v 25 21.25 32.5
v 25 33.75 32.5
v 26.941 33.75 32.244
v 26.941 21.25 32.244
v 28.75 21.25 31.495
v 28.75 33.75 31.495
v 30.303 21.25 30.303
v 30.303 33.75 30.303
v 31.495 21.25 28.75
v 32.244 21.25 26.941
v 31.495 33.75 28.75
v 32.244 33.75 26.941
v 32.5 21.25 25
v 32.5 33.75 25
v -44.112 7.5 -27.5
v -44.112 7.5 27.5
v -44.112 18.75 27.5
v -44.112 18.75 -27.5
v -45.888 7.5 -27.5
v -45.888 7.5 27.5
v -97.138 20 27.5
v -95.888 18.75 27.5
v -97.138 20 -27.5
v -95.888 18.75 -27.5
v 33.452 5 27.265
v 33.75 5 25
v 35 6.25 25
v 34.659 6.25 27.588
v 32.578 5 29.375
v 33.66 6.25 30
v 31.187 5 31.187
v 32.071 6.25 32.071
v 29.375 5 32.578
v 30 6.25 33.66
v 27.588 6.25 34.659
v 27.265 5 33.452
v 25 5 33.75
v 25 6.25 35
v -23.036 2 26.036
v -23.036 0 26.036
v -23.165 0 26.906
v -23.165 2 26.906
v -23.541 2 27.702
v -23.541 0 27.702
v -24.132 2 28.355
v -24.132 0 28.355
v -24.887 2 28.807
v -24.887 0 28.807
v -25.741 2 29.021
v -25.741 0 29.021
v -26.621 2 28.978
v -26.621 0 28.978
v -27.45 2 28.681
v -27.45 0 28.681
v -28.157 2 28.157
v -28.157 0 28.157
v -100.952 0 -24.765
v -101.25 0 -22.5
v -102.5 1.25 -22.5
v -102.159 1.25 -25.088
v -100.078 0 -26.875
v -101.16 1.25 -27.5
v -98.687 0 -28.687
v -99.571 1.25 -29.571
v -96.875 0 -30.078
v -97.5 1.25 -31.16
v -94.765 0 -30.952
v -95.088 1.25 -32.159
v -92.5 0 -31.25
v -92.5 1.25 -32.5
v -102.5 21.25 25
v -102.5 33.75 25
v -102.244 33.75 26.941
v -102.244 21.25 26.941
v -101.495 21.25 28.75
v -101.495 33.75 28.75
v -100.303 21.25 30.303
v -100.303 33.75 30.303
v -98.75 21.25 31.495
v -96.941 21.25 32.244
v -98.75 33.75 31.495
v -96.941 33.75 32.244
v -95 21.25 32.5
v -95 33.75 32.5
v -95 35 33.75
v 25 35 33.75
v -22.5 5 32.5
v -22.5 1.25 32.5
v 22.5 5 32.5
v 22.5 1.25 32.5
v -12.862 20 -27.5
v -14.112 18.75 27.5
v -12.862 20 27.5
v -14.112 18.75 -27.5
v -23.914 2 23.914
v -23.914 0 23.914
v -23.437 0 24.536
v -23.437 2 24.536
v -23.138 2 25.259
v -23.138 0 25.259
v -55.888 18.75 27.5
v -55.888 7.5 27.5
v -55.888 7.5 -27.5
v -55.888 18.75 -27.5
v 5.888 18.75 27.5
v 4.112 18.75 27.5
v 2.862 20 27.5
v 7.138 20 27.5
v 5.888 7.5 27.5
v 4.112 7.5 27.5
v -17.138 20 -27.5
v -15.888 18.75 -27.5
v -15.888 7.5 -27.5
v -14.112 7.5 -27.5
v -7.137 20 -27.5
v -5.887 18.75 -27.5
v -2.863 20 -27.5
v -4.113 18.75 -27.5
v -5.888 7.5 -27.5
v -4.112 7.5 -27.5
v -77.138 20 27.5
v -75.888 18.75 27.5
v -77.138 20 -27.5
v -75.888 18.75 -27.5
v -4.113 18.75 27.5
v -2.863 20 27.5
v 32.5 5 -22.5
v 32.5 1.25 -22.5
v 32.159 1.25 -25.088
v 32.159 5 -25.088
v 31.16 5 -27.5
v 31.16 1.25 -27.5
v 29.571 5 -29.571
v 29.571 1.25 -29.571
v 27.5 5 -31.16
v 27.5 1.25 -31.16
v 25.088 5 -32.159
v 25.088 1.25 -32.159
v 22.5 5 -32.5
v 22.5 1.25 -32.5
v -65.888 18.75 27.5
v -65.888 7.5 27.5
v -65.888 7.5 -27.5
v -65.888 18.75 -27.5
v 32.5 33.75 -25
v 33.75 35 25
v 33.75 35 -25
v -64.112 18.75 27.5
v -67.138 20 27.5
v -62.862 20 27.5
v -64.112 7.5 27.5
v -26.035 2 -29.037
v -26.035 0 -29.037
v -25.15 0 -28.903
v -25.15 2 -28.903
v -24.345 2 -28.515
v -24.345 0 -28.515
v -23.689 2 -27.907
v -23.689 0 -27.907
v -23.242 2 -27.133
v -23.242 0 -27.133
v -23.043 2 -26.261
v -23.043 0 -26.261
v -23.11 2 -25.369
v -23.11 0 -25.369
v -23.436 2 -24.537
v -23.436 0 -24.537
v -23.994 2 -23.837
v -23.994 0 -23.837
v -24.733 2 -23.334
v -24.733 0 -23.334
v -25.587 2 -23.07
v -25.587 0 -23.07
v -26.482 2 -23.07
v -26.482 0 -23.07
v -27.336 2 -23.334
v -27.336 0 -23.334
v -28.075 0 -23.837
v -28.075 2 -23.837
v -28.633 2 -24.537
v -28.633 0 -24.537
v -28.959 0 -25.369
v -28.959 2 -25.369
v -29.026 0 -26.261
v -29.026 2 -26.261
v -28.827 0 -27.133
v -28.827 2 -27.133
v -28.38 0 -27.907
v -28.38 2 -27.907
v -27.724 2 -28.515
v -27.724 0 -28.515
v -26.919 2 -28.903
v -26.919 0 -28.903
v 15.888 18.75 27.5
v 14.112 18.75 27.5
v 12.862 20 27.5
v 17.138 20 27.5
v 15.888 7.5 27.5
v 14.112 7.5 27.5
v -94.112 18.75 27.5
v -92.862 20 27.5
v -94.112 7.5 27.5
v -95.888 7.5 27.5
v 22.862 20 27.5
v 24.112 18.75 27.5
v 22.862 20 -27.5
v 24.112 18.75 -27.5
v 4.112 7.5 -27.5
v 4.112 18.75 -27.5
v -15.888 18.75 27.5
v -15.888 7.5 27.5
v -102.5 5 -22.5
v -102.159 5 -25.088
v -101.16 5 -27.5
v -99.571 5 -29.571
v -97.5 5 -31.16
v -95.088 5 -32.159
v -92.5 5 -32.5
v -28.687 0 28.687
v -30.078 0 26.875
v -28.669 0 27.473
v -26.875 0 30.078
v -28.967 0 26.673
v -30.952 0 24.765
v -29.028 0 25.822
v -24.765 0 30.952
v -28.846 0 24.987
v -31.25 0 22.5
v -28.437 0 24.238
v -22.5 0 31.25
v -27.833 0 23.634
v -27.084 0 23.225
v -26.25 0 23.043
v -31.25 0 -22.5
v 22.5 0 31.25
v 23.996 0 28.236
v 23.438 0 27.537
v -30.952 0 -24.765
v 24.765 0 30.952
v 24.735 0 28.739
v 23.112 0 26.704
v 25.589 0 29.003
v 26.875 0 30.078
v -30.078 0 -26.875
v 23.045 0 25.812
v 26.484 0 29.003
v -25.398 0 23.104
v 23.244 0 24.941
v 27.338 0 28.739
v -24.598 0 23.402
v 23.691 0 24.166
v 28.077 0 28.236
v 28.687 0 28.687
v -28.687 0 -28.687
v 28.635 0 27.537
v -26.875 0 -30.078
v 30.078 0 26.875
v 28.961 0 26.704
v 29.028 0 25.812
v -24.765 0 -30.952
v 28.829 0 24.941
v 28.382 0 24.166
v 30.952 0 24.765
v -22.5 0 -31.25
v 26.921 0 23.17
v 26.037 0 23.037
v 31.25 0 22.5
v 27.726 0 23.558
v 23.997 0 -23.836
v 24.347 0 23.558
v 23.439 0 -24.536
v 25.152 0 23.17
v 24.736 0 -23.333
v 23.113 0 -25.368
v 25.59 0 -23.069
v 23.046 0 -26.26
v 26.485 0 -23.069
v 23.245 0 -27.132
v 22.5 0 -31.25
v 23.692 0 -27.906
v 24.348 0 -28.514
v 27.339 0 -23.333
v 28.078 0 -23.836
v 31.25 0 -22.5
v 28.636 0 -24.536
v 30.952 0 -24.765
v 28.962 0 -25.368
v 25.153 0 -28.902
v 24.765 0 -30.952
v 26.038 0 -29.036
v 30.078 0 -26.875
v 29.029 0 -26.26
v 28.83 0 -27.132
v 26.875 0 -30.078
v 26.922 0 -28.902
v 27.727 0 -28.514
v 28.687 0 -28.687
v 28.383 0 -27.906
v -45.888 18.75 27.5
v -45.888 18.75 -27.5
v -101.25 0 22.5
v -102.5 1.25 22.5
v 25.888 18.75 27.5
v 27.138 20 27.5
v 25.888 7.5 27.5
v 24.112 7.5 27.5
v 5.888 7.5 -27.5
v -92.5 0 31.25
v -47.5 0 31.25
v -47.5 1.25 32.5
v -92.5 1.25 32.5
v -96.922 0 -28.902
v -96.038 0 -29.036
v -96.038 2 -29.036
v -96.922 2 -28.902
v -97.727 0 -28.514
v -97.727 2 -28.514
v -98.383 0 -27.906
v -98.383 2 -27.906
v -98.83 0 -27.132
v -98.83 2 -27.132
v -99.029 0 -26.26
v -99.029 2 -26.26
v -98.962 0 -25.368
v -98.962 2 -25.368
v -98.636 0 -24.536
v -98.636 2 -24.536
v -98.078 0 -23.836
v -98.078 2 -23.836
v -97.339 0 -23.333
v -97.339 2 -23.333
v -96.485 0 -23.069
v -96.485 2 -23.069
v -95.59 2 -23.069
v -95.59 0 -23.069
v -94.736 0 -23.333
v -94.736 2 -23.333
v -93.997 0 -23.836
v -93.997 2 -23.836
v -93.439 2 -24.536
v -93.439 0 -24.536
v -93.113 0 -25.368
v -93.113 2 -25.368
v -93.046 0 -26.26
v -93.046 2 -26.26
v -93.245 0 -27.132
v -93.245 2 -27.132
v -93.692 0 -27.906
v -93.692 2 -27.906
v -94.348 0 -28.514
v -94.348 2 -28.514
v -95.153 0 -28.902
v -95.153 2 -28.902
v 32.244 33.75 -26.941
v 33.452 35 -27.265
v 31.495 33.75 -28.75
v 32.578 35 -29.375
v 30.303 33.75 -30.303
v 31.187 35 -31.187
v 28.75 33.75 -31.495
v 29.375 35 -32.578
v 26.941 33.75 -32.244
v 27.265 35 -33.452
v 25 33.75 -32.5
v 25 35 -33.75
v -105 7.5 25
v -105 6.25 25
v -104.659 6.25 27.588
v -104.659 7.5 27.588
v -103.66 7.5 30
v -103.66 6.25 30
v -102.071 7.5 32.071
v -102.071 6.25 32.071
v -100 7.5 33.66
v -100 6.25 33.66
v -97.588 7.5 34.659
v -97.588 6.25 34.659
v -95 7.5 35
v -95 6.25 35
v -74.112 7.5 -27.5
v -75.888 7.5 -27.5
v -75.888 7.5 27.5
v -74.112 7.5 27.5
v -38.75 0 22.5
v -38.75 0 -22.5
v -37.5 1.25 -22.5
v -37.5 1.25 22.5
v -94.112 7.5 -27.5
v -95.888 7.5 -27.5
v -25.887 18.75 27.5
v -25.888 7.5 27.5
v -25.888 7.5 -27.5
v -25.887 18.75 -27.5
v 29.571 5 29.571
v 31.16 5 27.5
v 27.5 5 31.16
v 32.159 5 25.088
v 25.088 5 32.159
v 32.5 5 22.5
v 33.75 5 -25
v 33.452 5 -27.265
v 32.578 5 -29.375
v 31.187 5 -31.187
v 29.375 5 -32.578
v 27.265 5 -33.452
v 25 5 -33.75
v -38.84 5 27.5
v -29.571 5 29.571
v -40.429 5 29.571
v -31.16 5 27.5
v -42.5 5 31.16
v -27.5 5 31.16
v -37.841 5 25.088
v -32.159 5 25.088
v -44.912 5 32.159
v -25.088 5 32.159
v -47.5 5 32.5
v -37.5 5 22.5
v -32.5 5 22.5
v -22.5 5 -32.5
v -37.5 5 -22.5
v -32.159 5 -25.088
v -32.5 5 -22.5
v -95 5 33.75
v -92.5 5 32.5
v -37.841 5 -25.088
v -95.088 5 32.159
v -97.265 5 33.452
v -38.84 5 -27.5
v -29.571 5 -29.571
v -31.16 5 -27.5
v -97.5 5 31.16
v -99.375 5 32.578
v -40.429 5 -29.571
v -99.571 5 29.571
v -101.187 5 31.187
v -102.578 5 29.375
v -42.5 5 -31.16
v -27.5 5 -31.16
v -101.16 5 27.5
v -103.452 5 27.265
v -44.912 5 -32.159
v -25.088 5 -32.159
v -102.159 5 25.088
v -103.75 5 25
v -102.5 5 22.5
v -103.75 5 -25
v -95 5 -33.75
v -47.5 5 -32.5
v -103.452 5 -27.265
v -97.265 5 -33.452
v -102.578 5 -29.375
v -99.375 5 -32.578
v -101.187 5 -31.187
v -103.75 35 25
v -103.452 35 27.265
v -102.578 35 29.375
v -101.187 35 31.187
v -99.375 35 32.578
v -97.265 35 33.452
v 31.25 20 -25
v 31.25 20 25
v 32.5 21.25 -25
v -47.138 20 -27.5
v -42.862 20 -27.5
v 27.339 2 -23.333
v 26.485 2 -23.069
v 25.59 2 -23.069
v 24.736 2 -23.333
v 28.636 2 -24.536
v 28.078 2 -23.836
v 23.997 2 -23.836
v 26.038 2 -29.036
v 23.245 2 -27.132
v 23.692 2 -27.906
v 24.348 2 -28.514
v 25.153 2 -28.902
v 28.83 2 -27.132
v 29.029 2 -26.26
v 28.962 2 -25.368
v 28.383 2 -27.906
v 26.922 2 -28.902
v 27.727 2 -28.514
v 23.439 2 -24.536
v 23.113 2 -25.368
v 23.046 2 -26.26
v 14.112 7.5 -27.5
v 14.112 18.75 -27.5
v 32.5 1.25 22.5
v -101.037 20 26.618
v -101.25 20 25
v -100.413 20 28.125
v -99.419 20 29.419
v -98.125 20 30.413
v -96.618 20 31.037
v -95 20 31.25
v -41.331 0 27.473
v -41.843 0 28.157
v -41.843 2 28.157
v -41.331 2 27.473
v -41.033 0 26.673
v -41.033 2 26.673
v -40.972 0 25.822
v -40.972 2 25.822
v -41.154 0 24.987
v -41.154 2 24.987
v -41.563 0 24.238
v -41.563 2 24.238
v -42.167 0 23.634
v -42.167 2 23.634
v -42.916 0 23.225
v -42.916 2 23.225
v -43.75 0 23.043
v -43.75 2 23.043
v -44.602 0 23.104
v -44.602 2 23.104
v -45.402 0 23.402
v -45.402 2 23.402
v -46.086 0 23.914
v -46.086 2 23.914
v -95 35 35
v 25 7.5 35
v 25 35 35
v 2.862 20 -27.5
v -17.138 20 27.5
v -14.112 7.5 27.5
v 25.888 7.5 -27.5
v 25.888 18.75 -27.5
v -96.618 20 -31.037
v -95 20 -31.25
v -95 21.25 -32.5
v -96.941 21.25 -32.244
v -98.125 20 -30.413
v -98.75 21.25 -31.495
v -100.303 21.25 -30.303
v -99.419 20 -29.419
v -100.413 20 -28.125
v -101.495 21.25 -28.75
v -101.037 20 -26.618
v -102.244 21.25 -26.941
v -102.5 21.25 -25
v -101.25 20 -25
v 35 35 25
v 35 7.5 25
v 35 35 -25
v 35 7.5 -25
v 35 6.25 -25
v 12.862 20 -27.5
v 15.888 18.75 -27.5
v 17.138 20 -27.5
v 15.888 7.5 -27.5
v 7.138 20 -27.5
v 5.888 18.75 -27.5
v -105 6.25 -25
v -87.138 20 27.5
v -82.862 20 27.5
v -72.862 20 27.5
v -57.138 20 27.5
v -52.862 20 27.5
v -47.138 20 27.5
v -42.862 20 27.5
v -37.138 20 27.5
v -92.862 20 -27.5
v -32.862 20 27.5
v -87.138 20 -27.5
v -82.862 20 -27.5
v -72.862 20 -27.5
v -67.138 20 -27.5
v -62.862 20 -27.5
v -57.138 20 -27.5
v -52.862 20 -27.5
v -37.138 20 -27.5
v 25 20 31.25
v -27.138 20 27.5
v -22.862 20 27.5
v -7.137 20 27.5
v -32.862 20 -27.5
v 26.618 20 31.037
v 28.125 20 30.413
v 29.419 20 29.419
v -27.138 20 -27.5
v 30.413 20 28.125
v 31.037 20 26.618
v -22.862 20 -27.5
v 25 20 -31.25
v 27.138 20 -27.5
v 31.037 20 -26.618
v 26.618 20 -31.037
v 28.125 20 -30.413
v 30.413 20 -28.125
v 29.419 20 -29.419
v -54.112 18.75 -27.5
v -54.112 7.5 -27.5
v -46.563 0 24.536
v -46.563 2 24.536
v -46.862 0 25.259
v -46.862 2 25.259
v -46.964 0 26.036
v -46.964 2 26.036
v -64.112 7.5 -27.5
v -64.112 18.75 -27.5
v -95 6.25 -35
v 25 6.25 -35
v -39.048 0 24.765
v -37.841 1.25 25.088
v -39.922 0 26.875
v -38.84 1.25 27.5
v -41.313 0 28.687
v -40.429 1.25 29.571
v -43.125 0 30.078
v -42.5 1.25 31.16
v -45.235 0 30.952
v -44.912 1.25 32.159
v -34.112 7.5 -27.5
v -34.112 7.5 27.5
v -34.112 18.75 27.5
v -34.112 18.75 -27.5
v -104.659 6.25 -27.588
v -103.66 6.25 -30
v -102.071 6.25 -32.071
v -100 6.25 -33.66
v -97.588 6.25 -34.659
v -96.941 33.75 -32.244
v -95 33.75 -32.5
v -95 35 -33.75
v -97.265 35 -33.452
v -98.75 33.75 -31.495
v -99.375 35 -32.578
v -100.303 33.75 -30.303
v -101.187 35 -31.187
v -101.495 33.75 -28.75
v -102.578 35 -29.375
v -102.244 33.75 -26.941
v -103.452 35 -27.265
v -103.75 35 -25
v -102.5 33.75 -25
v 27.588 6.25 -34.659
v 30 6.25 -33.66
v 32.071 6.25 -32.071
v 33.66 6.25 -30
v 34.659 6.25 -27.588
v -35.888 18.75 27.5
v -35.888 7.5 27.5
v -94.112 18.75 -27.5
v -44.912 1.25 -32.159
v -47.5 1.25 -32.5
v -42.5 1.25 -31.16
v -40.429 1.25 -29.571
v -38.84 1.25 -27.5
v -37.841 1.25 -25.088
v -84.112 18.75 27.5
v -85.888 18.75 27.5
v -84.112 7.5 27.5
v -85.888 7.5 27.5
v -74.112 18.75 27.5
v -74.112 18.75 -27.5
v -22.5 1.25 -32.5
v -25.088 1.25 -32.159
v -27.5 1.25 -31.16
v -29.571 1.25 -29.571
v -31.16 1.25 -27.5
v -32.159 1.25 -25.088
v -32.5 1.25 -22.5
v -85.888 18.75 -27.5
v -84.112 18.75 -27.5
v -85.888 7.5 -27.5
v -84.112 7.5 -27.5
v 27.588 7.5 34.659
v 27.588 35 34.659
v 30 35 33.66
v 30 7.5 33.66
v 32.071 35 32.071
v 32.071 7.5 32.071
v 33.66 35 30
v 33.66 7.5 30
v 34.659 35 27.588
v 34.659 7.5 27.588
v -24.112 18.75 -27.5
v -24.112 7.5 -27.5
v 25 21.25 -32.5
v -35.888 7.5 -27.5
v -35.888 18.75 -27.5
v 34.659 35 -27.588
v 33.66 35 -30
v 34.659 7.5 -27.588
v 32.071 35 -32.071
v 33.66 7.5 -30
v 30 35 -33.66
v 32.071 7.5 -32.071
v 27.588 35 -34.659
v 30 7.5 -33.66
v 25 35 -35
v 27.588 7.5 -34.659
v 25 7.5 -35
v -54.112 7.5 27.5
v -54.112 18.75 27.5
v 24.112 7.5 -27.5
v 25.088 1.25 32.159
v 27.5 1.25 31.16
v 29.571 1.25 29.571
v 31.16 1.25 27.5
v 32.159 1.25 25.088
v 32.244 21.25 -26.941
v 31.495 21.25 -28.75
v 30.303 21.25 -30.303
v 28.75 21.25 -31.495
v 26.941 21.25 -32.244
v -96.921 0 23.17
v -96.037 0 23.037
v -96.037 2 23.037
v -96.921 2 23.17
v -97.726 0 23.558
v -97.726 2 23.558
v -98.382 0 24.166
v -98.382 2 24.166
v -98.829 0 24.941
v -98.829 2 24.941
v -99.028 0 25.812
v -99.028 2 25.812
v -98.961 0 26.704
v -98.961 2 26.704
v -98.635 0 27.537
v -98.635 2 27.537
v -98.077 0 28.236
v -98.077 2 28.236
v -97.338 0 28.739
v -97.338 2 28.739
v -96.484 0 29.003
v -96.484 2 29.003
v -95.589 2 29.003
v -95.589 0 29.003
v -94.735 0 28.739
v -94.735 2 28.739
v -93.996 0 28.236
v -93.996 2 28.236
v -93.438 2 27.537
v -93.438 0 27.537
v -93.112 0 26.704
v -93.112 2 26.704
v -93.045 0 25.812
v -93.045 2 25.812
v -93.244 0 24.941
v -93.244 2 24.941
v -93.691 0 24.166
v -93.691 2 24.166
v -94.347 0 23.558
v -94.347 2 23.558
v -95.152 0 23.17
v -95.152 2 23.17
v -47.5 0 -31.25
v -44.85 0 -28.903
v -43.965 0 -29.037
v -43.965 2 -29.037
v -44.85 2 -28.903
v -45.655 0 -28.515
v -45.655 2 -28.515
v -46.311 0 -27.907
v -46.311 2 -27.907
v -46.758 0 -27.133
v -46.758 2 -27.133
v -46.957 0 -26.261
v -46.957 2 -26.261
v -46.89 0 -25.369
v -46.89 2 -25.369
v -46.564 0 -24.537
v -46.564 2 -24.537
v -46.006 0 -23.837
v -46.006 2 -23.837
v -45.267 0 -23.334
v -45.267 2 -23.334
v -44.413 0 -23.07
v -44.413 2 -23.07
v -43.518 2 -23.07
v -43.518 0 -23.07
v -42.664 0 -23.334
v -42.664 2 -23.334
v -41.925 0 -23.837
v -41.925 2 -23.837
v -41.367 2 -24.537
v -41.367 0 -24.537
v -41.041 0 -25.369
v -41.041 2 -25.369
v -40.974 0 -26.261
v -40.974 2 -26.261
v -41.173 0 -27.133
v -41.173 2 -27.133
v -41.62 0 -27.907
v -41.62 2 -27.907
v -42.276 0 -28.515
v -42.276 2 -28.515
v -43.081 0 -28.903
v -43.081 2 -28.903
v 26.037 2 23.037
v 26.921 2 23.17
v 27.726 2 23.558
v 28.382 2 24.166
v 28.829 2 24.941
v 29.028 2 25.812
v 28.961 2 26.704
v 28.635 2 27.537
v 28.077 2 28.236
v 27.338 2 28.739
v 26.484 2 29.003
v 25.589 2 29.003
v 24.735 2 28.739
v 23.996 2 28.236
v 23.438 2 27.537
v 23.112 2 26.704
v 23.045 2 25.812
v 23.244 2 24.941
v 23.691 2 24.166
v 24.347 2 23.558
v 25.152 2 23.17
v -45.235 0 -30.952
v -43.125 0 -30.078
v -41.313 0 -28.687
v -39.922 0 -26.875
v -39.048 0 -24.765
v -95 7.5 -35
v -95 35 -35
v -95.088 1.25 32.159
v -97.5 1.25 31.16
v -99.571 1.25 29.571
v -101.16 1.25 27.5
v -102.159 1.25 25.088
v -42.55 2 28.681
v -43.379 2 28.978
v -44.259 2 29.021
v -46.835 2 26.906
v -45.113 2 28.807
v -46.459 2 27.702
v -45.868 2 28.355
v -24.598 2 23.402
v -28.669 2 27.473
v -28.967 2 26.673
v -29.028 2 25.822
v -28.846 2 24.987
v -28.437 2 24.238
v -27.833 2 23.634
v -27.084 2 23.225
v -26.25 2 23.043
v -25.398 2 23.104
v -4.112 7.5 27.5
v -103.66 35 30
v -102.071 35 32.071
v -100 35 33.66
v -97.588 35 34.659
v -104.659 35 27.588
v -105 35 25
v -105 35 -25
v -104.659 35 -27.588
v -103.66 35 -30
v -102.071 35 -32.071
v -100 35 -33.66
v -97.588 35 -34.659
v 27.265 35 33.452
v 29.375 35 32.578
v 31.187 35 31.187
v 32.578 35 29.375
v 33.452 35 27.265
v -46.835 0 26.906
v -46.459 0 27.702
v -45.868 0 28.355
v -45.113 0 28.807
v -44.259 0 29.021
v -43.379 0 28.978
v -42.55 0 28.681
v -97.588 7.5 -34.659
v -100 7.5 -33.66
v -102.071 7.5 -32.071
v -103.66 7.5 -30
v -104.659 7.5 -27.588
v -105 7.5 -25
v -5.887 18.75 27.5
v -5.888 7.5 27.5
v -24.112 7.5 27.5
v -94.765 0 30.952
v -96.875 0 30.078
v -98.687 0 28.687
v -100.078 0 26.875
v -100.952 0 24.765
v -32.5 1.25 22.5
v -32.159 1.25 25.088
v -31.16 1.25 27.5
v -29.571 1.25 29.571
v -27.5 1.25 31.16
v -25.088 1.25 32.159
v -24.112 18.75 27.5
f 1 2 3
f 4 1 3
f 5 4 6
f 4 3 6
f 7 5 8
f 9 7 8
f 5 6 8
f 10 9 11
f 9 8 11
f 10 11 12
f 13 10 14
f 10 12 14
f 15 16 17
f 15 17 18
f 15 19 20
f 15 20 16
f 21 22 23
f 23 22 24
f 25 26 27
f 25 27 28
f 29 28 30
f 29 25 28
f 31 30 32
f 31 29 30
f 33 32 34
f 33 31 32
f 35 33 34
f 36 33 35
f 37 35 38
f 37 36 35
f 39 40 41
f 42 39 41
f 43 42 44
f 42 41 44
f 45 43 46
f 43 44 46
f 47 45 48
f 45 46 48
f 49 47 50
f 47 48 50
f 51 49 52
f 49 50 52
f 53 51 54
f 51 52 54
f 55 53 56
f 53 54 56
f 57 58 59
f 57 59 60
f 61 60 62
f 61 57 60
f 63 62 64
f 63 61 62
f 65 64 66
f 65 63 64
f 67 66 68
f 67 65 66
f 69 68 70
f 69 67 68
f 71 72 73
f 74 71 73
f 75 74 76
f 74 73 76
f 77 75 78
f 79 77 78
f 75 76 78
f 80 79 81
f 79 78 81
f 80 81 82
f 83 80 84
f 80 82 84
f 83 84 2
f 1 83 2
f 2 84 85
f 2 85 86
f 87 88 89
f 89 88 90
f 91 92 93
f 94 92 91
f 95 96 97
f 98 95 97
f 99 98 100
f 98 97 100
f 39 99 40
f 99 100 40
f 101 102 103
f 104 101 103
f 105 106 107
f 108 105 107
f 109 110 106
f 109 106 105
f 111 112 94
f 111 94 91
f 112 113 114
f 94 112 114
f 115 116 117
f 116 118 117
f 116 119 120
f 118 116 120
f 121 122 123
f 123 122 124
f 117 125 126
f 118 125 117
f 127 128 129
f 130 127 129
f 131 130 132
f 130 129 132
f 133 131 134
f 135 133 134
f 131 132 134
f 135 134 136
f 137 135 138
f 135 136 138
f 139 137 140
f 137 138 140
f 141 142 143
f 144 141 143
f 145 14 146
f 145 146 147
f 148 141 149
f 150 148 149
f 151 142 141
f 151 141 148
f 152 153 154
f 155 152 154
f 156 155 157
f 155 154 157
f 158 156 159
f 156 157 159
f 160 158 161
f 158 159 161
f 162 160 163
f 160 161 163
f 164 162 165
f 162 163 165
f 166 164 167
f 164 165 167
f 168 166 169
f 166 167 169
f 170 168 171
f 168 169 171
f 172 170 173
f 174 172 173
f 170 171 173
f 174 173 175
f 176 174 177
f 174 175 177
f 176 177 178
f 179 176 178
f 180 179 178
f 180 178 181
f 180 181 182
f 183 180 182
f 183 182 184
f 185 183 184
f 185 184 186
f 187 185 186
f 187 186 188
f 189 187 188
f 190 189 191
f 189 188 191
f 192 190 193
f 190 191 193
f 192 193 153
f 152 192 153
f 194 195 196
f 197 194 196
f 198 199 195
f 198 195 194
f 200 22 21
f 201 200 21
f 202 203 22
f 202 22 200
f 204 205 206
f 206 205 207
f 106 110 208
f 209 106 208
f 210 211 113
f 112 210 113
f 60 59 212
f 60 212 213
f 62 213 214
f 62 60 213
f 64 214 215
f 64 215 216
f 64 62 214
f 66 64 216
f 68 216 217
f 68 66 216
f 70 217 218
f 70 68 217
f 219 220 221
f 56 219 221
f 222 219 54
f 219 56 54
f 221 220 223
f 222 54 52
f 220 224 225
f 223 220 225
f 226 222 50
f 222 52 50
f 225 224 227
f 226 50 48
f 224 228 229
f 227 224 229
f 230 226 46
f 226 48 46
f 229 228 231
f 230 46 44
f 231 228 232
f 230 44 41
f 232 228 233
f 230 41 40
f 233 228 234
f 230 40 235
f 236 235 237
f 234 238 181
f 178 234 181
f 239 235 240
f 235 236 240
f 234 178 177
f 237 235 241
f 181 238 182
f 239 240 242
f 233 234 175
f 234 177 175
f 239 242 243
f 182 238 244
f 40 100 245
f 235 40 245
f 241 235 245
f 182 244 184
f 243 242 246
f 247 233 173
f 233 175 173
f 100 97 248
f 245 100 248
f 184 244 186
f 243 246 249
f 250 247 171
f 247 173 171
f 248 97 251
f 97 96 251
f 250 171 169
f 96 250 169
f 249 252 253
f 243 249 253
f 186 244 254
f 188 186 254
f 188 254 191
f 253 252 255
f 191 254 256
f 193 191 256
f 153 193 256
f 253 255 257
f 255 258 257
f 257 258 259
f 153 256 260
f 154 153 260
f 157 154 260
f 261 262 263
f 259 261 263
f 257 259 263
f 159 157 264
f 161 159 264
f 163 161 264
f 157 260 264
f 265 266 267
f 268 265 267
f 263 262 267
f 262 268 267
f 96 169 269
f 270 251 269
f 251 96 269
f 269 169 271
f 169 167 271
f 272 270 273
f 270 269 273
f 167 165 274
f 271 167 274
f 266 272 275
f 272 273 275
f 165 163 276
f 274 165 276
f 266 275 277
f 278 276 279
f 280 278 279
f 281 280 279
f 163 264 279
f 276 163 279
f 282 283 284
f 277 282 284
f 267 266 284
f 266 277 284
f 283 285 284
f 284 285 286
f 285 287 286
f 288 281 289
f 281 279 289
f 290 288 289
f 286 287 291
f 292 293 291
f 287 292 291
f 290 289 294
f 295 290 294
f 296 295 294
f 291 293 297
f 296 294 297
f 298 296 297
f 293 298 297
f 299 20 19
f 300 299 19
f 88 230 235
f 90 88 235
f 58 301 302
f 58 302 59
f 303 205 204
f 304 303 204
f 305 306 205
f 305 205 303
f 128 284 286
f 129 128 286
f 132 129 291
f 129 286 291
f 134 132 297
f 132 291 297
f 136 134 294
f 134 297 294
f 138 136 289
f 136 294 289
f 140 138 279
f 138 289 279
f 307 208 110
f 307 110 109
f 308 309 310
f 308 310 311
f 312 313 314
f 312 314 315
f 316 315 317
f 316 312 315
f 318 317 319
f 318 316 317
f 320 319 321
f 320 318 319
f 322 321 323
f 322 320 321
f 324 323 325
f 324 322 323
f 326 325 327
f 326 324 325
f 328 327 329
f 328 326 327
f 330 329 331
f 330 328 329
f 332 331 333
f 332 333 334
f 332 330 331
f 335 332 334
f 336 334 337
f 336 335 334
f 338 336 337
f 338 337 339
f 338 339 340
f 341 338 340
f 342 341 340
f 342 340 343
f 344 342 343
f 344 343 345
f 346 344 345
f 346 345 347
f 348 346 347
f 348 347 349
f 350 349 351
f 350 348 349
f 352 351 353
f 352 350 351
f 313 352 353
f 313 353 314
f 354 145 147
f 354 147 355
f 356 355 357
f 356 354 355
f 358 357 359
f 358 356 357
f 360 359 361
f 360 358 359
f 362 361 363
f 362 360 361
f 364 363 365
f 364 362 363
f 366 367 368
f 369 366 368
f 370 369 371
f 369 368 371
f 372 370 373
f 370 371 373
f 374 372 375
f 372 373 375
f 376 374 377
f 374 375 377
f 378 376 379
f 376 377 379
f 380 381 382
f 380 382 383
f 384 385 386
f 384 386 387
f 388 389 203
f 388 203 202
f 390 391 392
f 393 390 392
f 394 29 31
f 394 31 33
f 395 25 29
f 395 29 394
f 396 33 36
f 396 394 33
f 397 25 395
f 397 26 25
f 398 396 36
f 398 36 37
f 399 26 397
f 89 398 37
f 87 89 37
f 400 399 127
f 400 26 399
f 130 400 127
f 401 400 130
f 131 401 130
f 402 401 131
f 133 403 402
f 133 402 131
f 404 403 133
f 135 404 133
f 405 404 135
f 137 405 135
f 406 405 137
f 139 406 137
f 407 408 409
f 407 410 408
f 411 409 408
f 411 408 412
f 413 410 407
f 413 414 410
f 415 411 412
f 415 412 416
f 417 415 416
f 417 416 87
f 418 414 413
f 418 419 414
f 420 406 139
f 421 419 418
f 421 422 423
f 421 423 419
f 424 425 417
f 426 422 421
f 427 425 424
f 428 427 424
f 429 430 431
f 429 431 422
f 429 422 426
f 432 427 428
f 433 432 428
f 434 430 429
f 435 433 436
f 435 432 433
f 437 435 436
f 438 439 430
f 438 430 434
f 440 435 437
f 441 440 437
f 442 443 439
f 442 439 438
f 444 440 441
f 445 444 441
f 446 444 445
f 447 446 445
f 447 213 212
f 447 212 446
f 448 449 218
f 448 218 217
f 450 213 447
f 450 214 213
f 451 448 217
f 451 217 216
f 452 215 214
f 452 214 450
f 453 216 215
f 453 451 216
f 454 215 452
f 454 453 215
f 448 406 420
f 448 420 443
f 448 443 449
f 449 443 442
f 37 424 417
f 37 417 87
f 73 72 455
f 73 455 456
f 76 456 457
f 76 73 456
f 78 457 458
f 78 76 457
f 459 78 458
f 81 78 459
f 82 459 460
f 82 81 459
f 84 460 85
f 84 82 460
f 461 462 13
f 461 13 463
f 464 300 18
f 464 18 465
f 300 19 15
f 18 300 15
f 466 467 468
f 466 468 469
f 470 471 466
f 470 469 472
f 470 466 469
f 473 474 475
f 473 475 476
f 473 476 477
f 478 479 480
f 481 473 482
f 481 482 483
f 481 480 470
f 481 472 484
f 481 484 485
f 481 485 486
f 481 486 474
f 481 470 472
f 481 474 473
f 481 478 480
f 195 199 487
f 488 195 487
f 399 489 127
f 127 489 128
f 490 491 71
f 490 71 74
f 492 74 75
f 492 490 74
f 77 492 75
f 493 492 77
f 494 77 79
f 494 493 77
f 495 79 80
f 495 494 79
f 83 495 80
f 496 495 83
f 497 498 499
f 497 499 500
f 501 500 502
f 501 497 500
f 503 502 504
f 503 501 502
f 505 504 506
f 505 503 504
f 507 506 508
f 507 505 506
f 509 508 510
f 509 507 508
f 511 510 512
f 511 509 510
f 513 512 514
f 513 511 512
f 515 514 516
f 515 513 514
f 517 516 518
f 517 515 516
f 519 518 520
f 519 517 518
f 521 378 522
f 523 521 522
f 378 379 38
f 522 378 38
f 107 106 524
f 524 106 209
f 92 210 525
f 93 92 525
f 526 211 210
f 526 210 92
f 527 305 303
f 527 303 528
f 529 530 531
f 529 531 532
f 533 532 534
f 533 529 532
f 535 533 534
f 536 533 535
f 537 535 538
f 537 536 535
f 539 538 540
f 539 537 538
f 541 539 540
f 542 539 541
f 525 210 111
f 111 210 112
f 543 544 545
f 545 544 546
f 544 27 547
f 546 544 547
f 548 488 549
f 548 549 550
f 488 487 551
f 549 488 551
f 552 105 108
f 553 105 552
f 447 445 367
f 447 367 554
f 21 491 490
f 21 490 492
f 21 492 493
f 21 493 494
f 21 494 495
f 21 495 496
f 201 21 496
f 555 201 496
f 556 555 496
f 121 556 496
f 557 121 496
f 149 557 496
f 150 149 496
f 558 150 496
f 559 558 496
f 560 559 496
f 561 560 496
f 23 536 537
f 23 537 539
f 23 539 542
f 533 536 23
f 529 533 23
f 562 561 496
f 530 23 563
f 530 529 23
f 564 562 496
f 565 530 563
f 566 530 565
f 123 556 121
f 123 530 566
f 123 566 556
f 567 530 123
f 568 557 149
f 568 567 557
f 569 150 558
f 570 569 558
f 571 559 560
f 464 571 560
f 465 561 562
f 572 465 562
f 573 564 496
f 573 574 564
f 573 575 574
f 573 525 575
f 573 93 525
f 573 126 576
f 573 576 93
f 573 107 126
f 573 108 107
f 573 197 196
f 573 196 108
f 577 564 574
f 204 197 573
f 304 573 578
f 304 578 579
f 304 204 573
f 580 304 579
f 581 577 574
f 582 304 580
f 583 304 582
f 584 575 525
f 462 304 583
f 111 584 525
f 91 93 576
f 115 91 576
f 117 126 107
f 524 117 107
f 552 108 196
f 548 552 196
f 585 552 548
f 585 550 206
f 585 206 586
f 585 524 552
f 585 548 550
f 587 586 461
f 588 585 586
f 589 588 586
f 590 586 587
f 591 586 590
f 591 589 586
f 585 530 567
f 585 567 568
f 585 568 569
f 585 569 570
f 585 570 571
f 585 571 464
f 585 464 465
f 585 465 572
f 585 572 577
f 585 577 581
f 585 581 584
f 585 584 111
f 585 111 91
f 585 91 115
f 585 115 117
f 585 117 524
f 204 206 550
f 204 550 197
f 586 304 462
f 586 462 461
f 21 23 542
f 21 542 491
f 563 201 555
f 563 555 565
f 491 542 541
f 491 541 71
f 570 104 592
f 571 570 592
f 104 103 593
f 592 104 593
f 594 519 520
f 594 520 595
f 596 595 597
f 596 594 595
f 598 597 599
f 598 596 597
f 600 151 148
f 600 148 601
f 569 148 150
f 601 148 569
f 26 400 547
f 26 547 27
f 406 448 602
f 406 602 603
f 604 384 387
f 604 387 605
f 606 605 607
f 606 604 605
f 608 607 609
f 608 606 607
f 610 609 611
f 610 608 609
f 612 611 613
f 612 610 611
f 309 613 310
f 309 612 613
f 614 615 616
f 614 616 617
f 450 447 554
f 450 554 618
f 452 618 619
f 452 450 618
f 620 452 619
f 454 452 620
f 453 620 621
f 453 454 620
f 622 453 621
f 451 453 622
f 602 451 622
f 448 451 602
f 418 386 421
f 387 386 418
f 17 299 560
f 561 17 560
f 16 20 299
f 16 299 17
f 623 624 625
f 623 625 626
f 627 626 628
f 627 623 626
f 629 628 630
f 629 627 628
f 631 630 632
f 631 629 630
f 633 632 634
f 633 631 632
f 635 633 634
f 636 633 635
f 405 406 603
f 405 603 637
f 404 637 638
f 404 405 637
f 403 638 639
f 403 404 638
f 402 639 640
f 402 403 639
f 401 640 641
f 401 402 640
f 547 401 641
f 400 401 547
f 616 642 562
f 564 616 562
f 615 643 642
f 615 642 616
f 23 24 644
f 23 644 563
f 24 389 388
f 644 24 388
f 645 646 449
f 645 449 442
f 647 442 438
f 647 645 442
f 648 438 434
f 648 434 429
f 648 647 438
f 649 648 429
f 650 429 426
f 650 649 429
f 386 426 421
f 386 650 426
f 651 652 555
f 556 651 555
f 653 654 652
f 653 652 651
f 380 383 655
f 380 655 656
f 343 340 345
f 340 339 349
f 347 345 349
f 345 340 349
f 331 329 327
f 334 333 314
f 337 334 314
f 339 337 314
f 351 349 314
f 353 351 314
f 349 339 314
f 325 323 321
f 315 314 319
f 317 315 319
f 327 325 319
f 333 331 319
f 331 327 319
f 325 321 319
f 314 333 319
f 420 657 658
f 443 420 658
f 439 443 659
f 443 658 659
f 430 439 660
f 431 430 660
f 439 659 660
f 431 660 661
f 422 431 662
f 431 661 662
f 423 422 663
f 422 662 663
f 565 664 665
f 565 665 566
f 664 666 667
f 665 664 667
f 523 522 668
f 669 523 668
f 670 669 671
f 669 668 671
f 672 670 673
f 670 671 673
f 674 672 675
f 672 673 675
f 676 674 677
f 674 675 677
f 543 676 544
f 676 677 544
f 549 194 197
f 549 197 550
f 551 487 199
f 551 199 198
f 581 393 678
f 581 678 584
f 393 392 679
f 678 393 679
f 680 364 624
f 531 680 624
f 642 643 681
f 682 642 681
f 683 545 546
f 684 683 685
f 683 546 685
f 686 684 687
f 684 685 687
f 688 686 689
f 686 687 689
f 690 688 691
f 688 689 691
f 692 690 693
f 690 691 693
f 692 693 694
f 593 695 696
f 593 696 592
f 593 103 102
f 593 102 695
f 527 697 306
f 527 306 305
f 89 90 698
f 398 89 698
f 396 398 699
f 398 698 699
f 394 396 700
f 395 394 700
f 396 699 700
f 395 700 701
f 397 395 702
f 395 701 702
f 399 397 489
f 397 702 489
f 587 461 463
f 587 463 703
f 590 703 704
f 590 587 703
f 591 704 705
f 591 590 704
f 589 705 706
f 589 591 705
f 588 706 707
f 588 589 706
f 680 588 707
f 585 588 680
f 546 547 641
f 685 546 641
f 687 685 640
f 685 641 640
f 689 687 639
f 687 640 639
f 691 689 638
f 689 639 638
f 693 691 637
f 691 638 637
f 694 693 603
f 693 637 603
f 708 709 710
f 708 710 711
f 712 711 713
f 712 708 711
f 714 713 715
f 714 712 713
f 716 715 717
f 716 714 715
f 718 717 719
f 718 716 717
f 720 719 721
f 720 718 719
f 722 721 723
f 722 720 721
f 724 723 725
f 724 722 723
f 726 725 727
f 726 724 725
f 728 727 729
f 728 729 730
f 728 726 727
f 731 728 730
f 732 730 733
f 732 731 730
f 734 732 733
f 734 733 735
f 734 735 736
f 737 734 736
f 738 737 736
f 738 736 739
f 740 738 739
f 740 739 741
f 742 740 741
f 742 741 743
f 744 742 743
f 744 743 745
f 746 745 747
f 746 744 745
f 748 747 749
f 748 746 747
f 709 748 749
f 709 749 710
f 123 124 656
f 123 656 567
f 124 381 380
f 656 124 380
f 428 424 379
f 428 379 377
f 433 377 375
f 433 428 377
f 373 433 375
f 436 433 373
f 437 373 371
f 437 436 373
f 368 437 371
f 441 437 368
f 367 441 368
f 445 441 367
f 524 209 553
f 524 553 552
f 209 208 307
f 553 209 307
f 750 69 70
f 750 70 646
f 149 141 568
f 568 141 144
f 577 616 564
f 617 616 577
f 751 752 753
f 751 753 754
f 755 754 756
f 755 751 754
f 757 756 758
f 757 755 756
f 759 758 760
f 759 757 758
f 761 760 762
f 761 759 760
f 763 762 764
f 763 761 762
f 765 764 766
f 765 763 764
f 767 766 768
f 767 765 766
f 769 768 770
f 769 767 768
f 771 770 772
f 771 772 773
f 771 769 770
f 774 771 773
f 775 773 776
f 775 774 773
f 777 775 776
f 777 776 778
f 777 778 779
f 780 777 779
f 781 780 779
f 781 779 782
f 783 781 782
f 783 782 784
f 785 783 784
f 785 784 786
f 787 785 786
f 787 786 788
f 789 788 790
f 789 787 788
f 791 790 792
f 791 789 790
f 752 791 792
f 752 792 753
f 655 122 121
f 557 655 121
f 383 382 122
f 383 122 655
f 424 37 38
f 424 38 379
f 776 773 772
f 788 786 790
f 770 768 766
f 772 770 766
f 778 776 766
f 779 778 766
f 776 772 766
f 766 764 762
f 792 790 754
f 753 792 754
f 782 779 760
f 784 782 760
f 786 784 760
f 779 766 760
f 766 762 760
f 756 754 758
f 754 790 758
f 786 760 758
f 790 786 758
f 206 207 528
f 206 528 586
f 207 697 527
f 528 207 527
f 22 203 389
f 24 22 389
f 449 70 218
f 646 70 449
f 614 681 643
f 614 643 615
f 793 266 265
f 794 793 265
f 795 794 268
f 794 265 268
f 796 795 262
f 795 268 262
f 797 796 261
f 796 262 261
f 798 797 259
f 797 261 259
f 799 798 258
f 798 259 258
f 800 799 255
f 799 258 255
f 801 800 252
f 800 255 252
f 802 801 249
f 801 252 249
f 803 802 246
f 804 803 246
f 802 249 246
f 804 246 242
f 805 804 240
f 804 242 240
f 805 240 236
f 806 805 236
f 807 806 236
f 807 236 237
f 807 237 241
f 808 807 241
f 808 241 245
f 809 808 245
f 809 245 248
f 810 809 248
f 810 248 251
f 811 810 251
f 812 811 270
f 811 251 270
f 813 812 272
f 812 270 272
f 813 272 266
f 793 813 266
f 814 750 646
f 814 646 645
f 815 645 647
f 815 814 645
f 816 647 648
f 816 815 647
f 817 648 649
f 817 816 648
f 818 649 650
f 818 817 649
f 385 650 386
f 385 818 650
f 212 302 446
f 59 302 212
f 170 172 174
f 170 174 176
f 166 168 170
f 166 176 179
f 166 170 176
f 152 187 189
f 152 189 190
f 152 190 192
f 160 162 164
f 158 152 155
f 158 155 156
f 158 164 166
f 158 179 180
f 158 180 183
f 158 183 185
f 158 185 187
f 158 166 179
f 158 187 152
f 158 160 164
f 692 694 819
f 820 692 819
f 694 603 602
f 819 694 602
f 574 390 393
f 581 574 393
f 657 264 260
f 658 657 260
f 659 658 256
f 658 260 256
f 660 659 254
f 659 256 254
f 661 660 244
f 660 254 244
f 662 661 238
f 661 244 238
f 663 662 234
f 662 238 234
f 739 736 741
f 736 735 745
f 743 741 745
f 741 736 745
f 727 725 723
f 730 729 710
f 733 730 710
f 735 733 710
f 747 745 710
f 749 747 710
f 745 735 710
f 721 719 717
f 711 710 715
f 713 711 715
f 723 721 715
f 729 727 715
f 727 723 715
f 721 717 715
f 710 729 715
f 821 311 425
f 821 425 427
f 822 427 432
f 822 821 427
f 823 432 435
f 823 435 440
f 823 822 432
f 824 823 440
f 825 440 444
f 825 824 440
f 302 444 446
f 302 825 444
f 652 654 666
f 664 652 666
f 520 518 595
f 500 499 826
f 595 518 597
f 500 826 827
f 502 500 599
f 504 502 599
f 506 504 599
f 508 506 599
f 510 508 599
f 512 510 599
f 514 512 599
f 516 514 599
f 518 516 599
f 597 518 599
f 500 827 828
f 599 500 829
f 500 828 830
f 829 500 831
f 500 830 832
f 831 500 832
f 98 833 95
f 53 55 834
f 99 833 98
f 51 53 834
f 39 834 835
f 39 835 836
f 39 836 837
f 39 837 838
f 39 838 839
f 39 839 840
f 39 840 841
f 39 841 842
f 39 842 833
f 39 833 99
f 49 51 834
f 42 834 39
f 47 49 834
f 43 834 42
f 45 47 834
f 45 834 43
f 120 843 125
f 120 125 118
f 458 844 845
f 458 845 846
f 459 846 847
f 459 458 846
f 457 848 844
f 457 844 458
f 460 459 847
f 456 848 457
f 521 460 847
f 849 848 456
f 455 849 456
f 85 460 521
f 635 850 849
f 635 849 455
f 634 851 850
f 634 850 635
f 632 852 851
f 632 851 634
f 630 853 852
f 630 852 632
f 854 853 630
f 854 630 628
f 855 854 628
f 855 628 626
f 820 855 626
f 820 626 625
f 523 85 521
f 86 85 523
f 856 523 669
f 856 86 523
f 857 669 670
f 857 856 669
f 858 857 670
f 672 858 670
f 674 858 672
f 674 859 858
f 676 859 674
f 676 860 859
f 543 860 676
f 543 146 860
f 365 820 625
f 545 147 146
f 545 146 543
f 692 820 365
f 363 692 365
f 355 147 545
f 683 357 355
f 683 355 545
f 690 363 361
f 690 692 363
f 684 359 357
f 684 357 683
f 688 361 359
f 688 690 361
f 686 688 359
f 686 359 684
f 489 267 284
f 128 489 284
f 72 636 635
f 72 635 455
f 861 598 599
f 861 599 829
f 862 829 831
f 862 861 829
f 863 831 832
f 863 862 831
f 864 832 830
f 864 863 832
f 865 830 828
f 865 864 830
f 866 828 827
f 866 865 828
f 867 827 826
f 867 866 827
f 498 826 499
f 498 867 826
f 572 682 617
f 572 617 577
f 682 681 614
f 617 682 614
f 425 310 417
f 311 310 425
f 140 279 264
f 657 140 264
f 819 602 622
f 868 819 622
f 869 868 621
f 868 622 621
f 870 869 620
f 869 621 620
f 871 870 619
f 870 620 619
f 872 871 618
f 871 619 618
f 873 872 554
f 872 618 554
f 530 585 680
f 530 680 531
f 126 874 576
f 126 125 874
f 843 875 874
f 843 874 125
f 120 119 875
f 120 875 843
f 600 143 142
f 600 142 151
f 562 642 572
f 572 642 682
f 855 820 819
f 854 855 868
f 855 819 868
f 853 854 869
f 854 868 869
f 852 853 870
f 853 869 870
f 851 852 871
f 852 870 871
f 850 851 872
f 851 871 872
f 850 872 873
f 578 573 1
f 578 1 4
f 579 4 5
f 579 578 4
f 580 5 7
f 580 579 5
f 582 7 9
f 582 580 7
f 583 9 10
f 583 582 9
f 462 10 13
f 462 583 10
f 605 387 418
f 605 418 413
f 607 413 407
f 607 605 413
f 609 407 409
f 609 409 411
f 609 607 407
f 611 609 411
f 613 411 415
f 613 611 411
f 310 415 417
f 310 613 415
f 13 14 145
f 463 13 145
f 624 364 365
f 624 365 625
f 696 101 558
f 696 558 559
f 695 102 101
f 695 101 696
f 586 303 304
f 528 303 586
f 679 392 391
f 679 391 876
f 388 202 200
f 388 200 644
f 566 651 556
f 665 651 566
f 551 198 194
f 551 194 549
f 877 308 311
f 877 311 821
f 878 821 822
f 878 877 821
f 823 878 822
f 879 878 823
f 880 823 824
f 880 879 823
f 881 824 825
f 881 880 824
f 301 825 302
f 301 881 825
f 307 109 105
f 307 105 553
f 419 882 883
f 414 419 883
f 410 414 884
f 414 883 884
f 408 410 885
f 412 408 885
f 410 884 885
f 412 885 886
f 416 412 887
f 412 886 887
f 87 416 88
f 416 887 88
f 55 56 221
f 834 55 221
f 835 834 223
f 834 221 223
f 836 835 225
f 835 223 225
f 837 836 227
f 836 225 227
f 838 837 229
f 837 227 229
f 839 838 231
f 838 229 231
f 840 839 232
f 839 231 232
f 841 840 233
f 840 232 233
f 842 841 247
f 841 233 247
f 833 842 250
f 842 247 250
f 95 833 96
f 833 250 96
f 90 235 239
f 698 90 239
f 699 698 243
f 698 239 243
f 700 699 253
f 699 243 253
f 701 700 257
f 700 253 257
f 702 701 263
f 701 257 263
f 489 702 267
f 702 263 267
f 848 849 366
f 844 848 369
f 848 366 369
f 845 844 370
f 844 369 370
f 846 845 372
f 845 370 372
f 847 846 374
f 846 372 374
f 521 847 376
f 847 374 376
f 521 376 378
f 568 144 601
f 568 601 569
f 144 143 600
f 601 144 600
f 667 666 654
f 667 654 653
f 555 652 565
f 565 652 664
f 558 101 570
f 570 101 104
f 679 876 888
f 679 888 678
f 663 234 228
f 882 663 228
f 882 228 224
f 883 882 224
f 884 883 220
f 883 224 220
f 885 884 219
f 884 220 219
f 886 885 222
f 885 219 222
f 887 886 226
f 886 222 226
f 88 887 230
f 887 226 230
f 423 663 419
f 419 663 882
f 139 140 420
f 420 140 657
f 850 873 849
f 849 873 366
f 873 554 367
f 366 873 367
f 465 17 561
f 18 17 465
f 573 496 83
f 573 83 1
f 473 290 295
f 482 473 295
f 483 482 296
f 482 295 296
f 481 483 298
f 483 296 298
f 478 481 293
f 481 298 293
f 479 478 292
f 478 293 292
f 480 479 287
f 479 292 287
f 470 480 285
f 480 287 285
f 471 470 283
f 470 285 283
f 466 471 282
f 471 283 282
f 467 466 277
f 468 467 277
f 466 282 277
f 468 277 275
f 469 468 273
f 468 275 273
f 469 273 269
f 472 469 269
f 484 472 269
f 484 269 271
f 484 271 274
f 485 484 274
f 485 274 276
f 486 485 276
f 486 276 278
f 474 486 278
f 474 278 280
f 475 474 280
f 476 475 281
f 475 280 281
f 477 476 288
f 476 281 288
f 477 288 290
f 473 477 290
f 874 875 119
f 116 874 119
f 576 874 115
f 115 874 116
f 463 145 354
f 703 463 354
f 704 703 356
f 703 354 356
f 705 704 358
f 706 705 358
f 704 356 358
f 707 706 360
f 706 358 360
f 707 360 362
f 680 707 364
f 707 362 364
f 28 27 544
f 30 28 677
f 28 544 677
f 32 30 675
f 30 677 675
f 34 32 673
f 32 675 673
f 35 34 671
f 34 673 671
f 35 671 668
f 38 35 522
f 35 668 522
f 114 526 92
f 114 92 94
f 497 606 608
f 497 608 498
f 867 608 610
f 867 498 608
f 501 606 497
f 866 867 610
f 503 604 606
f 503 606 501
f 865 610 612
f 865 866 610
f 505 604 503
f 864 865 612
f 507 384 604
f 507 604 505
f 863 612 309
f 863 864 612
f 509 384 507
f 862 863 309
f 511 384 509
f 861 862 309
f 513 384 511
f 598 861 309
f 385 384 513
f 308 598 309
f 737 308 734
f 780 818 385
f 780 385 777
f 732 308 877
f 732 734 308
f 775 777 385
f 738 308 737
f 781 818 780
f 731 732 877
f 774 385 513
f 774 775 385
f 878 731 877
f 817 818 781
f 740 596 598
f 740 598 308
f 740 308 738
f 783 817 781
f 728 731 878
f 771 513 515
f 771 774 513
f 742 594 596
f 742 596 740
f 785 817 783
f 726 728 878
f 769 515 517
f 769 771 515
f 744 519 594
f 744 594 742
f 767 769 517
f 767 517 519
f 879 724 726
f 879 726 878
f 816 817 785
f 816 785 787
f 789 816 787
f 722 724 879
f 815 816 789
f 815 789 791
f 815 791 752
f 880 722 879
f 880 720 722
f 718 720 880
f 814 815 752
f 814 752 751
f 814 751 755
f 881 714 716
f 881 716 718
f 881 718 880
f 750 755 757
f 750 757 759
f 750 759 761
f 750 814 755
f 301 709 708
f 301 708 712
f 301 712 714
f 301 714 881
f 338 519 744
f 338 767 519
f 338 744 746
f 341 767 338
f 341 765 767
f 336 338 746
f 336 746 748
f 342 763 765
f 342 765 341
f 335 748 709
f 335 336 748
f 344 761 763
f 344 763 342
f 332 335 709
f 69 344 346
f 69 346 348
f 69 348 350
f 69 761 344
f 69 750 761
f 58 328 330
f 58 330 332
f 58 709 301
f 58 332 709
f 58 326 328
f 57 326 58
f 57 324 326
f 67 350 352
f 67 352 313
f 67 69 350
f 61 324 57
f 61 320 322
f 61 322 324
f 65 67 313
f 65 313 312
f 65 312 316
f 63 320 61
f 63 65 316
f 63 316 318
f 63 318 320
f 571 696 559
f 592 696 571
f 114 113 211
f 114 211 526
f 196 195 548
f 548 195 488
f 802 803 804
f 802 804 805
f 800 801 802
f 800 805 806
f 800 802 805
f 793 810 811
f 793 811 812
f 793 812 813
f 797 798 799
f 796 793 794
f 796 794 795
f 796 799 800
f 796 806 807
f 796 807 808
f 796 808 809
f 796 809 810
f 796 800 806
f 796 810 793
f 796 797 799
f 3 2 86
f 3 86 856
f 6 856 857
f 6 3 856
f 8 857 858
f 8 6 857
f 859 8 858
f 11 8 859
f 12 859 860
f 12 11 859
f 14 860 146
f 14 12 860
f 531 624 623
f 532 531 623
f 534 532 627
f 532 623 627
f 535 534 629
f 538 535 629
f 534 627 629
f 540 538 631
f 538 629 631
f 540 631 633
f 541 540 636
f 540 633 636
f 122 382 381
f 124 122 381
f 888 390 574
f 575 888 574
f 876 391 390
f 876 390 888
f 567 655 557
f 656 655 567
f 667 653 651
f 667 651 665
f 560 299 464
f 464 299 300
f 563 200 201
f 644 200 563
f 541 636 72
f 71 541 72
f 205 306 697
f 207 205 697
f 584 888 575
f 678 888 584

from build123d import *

# Parameters (mm, degrees)
BOSS_EXTRUDE4_DEPTH = 5
SKETCH6_W           = 70
SKETCH6_H           = 70
BOSS_EXTRUDE5_DEPTH = 30
SKETCH8_R           = 3
CUT_EXTRUDE1_DEPTH  = 2
CUT_EXTRUDE2_START  = -30
CUT_EXTRUDE2_DEPTH  = 30
SKETCH10_W          = 140
SKETCH10_H          = 70
BOSS_EXTRUDE6_DEPTH = 2.5
FILLET1_R           = 10
SKETCH11_W          = 202.57423707
SKETCH11_H          = 181.335779968
CUT_EXTRUDE3_DEPTH  = 27.5
SKETCH12_W          = 1.775
SKETCH12_H          = 55
BOSS_EXTRUDE9_DEPTH = 27.5
CUT_EXTRUDE4_DEPTH  = 15
CHAMFER2_SIZE       = 1.25
CHAMFER4_SIZE       = 1.25
CHAMFER5_SIZE       = 1.25


with BuildPart() as part:
    # Sketch5 → Boss-Extrude4 (new body)
    with BuildSketch(Plane(origin=(0, 0, 0), x_dir=(1, 0, 0), z_dir=(0, 1, 0))):
        with BuildLine():
            Line((-22.5, -32.5), (22.5, -32.5))
            ThreePointArc((22.5, -32.5), (29.571067812, -29.571067812), (32.5, -22.5))
            Line((32.5, -22.5), (32.5, 22.5))
            ThreePointArc((32.5, 22.5), (29.571067812, 29.571067812), (22.5, 32.5))
            Line((22.5, 32.5), (-22.5, 32.5))
            ThreePointArc((-22.5, 32.5), (-29.571067812, 29.571067812), (-32.5, 22.5))
            Line((-32.5, 22.5), (-32.5, -22.5))
            ThreePointArc((-32.5, -22.5), (-29.571067812, -29.571067812), (-22.5, -32.5))
        make_face()
    extrude(amount=BOSS_EXTRUDE4_DEPTH)

    # Sketch6 → Boss-Extrude5 (add)
    with BuildSketch(Plane(origin=(0, 5, 0), x_dir=(1, 0, 0), z_dir=(0, 1, 0))):
        Rectangle(SKETCH6_W, SKETCH6_H)
    extrude(amount=BOSS_EXTRUDE5_DEPTH)

    # Sketch8 → Cut-Extrude1 (cut)
    with BuildSketch(Plane.XZ):
        with Locations(Location((26.037533906, -26.035533906, 0), (0, 0, 270))):
            Circle(SKETCH8_R)
        with Locations(Location((26.036533906, 26.036533906, 0), (0, 0, 270))):
            Circle(SKETCH8_R)
        with BuildLine():
            ThreePointArc((-23.035533906, 26.035533906), (-24.887483609, 28.807172503), (-28.156854249, 28.156854249))
            Line((-28.156854249, 28.156854249), (-23.914213562, 23.914213562))
            ThreePointArc((-23.914213562, 23.914213562), (-23.263895308, 24.887483609), (-23.035533906, 26.035533906))
        make_face()
        with BuildLine():
            Line((-23.914213562, 23.914213562), (-28.156854249, 28.156854249))
            ThreePointArc((-28.156854249, 28.156854249), (-28.156854249, 23.914213562), (-23.914213562, 23.914213562))
        make_face()
        with Locations(Location((-26.034533906, -26.036533906, 0), (0, 0, 270))):
            Circle(SKETCH8_R)
    extrude(amount=-CUT_EXTRUDE1_DEPTH, mode=Mode.SUBTRACT)

    # Mirror1: part across plane


with BuildPart() as part_1:
    add(part.part)
    add(part.part.mirror(Plane(origin=(-35, 35, -35), x_dir=(0, 0, 1), z_dir=(1, 0, 0))))

    # Sketch9 → Cut-Extrude2 (cut)
    with BuildSketch(Plane(origin=(0, 35, 0), x_dir=(1, 0, 0), z_dir=(0, 1, 0)).offset(CUT_EXTRUDE2_START)):
        with BuildLine():
            Line((22.5, 32.5), (-92.5, 32.5))
            ThreePointArc((-92.5, 32.5), (-99.571067812, 29.571067812), (-102.5, 22.5))
            Line((-102.5, 22.5), (-102.5, -22.5))
            ThreePointArc((-102.5, -22.5), (-99.571067812, -29.571067812), (-92.5, -32.5))
            Line((-92.5, -32.5), (22.5, -32.5))
            ThreePointArc((22.5, -32.5), (29.571067812, -29.571067812), (32.5, -22.5))
            Line((32.5, -22.5), (32.5, 22.5))
            ThreePointArc((32.5, 22.5), (29.571067812, 29.571067812), (22.5, 32.5))
        make_face()
    extrude(amount=CUT_EXTRUDE2_DEPTH, mode=Mode.SUBTRACT)


with BuildPart() as cut_extrude2_piece_1:
    # of the separate pieces the step leaves, piece 1, a body of its own (cut_extrude2_pieces)
    add(part_1.part.solids().sort_by_distance((35, 5, -35))[0])



with BuildPart() as cut_extrude2_piece_2:
    # of the separate pieces the step leaves, piece 2, a body of its own (cut_extrude2_pieces)
    add(part_1.part.solids().sort_by_distance((-22.5, 0, 32.5))[0])


with BuildPart() as cut_extrude2_piece_3:
    # of the separate pieces the step leaves, piece 3, a body of its own (cut_extrude2_pieces)
    add(part_1.part.solids().sort_by_distance((-92.5, 0, -32.5))[0])


with BuildPart() as cut_extrude2_piece_1_1:
    add(cut_extrude2_piece_1.part)

    add(cut_extrude2_piece_2.part)  # Boss-Extrude6 merges Cut-Extrude2 piece 2

    add(cut_extrude2_piece_3.part)  # Boss-Extrude6 merges Cut-Extrude2 piece 3
    # Sketch10 → Boss-Extrude6 (add)
    with BuildSketch(Plane.XZ.offset(-5)):
        with Locations((-35, 0)):
            Rectangle(SKETCH10_W, SKETCH10_H)
    extrude(amount=-BOSS_EXTRUDE6_DEPTH)

    # Fillet1
    fillet1_edges = [cut_extrude2_piece_1_1.edges().sort_by_distance(p)[0] for p in [
        (35, 20, 35),
        (35, 20, -35),
        (-105, 20, 35),
        (-105, 20, -35),
    ]]
    fillet(fillet1_edges, radius=FILLET1_R)

    # Sketch11 → Cut-Extrude3 (cut)
    with BuildSketch(Plane(origin=(0, 35, 0), x_dir=(1, 0, 0), z_dir=(0, 1, 0))):
        with Locations((-35, 32.5)):
            Rectangle(SKETCH11_W, SKETCH11_H)
    extrude(amount=-CUT_EXTRUDE3_DEPTH, mode=Mode.SUBTRACT)

    # Sketch12 → Boss-Extrude9 (add)
    with BuildSketch(Plane(origin=(0, 7.5, 0), x_dir=(1, 0, 0), z_dir=(0, 1, 0))):
        with BuildLine():
            Line((-105, 25), (-105, -25))
            ThreePointArc((-105, -25), (-102.071067812, -32.071067812), (-95, -35))
            Line((-95, -35), (25, -35))
            ThreePointArc((25, -35), (32.071067812, -32.071067812), (35, -25))
            Line((35, -25), (35, 25))
            ThreePointArc((35, 25), (32.071067812, 32.071067812), (25, 35))
            Line((25, 35), (-95, 35))
            ThreePointArc((-95, 35), (-102.071067812, 32.071067812), (-105, 25))
        make_face()
        with Locations((-85, 0)):
            Rectangle(SKETCH12_W, SKETCH12_H, mode=Mode.SUBTRACT)
        with Locations((-75, 0)):
            Rectangle(SKETCH12_W, SKETCH12_H, mode=Mode.SUBTRACT)
        with Locations((-65, 0)):
            Rectangle(SKETCH12_W, SKETCH12_H, mode=Mode.SUBTRACT)
        with Locations((-55, 0)):
            Rectangle(SKETCH12_W, SKETCH12_H, mode=Mode.SUBTRACT)
        with Locations((-45, 0)):
            Rectangle(SKETCH12_W, SKETCH12_H, mode=Mode.SUBTRACT)
        with Locations((-35, 0)):
            Rectangle(SKETCH12_W, SKETCH12_H, mode=Mode.SUBTRACT)
        with Locations((-95, 0)):
            Rectangle(SKETCH12_W, SKETCH12_H, mode=Mode.SUBTRACT)
        with Locations((-25, 0)):
            Rectangle(SKETCH12_W, SKETCH12_H, mode=Mode.SUBTRACT)
        with Locations((-15, 0)):
            Rectangle(SKETCH12_W, SKETCH12_H, mode=Mode.SUBTRACT)
        with Locations((-5, 0)):
            Rectangle(SKETCH12_W, SKETCH12_H, mode=Mode.SUBTRACT)
        with Locations((5, 0)):
            Rectangle(SKETCH12_W, SKETCH12_H, mode=Mode.SUBTRACT)
        with Locations((15, 0)):
            Rectangle(SKETCH12_W, SKETCH12_H, mode=Mode.SUBTRACT)
        with Locations((25, 0)):
            Rectangle(SKETCH12_W, SKETCH12_H, mode=Mode.SUBTRACT)
    extrude(amount=BOSS_EXTRUDE9_DEPTH)

    # Sketch13 → Cut-Extrude4 (cut)
    with BuildSketch(Plane(origin=(0, 35, 0), x_dir=(1, 0, 0), z_dir=(0, 1, 0))):
        with BuildLine():
            Line((32.5, -25), (32.5, 25))
            ThreePointArc((32.5, 25), (30.303300859, 30.303300859), (25, 32.5))
            Line((25, 32.5), (-95, 32.5))
            ThreePointArc((-95, 32.5), (-100.303300859, 30.303300859), (-102.5, 25))
            Line((-102.5, 25), (-102.5, -25))
            ThreePointArc((-102.5, -25), (-100.303300859, -30.303300859), (-95, -32.5))
            Line((-95, -32.5), (25, -32.5))
            ThreePointArc((25, -32.5), (30.303300859, -30.303300859), (32.5, -25))
        make_face()
    extrude(amount=-CUT_EXTRUDE4_DEPTH, mode=Mode.SUBTRACT)

    # Chamfer2
    chamfer2_edges = [cut_extrude2_piece_1_1.edges().sort_by_distance(p)[0] for p in [
        (30.303300859, 20, -30.303300859),
        (32.5, 20, 0),
        (30.303300859, 20, 30.303300859),
        (-35, 20, 32.5),
        (-100.303300859, 20, 30.303300859),
        (-102.5, 20, 0),
        (-100.303300859, 20, -30.303300859),
        (-35, 20, -32.5),
        (30.303300859, 35, -30.303300859),
        (-35, 35, -32.5),
        (-100.303300859, 35, -30.303300859),
        (-102.5, 35, 0),
        (-100.303300859, 35, 30.303300859),
        (-35, 35, 32.5),
        (30.303300859, 35, 30.303300859),
        (32.5, 35, 0),
    ]]
    chamfer(chamfer2_edges, length=CHAMFER2_SIZE)

    # Chamfer4
    chamfer4_edges = [cut_extrude2_piece_1_1.edges().sort_by_distance(p)[0] for p in [
        (-29.571067812, 0, 29.571067812),
        (0, 0, 32.5),
        (29.571067812, 0, 29.571067812),
        (32.5, 0, 0),
        (29.571067812, 0, -29.571067812),
        (0, 0, -32.5),
        (-29.571067812, 0, -29.571067812),
        (-32.5, 0, 0),
        (-40.428932188, 0, 29.571067812),
        (-70, 0, 32.5),
        (-99.571067812, 0, 29.571067812),
        (-102.5, 0, 0),
        (-99.571067812, 0, -29.571067812),
        (-70, 0, -32.5),
        (-40.428932188, 0, -29.571067812),
        (-37.5, 0, 0),
        (-35, 5, -35),
        (-35, 5, 35),
        (-105, 5, 0),
        (35, 5, 0),
        (-102.071067812, 5, -32.071067812),
        (-102.071067812, 5, 32.071067812),
        (32.071067812, 5, 32.071067812),
        (32.071067812, 5, -32.071067812),
    ]]
    chamfer(chamfer4_edges, length=CHAMFER4_SIZE)

    # Chamfer5
    chamfer5_edges = [cut_extrude2_piece_1_1.edges().sort_by_distance(p)[0] for p in [
        (25.8875, 20, 0),
        (-94.1125, 20, 0),
        (-95.8875, 20, 0),
        (-84.1125, 20, 0),
        (-85.8875, 20, 0),
        (-74.1125, 20, 0),
        (-75.8875, 20, 0),
        (-64.1125, 20, 0),
        (-65.8875, 20, 0),
        (-54.1125, 20, 0),
        (-55.8875, 20, 0),
        (-44.1125, 20, 0),
        (-45.8875, 20, 0),
        (-34.1125, 20, 0),
        (-35.8875, 20, 0),
        (-24.1125, 20, 0),
        (-25.8875, 20, 0),
        (-14.1125, 20, 0),
        (-15.8875, 20, 0),
        (-4.1125, 20, 0),
        (-5.8875, 20, 0),
        (5.8875, 20, 0),
        (4.1125, 20, 0),
        (15.8875, 20, 0),
        (14.1125, 20, 0),
        (24.1125, 20, 0),
    ]]
    chamfer(chamfer5_edges, length=CHAMFER5_SIZE)


solid = cut_extrude2_piece_1_1.part
